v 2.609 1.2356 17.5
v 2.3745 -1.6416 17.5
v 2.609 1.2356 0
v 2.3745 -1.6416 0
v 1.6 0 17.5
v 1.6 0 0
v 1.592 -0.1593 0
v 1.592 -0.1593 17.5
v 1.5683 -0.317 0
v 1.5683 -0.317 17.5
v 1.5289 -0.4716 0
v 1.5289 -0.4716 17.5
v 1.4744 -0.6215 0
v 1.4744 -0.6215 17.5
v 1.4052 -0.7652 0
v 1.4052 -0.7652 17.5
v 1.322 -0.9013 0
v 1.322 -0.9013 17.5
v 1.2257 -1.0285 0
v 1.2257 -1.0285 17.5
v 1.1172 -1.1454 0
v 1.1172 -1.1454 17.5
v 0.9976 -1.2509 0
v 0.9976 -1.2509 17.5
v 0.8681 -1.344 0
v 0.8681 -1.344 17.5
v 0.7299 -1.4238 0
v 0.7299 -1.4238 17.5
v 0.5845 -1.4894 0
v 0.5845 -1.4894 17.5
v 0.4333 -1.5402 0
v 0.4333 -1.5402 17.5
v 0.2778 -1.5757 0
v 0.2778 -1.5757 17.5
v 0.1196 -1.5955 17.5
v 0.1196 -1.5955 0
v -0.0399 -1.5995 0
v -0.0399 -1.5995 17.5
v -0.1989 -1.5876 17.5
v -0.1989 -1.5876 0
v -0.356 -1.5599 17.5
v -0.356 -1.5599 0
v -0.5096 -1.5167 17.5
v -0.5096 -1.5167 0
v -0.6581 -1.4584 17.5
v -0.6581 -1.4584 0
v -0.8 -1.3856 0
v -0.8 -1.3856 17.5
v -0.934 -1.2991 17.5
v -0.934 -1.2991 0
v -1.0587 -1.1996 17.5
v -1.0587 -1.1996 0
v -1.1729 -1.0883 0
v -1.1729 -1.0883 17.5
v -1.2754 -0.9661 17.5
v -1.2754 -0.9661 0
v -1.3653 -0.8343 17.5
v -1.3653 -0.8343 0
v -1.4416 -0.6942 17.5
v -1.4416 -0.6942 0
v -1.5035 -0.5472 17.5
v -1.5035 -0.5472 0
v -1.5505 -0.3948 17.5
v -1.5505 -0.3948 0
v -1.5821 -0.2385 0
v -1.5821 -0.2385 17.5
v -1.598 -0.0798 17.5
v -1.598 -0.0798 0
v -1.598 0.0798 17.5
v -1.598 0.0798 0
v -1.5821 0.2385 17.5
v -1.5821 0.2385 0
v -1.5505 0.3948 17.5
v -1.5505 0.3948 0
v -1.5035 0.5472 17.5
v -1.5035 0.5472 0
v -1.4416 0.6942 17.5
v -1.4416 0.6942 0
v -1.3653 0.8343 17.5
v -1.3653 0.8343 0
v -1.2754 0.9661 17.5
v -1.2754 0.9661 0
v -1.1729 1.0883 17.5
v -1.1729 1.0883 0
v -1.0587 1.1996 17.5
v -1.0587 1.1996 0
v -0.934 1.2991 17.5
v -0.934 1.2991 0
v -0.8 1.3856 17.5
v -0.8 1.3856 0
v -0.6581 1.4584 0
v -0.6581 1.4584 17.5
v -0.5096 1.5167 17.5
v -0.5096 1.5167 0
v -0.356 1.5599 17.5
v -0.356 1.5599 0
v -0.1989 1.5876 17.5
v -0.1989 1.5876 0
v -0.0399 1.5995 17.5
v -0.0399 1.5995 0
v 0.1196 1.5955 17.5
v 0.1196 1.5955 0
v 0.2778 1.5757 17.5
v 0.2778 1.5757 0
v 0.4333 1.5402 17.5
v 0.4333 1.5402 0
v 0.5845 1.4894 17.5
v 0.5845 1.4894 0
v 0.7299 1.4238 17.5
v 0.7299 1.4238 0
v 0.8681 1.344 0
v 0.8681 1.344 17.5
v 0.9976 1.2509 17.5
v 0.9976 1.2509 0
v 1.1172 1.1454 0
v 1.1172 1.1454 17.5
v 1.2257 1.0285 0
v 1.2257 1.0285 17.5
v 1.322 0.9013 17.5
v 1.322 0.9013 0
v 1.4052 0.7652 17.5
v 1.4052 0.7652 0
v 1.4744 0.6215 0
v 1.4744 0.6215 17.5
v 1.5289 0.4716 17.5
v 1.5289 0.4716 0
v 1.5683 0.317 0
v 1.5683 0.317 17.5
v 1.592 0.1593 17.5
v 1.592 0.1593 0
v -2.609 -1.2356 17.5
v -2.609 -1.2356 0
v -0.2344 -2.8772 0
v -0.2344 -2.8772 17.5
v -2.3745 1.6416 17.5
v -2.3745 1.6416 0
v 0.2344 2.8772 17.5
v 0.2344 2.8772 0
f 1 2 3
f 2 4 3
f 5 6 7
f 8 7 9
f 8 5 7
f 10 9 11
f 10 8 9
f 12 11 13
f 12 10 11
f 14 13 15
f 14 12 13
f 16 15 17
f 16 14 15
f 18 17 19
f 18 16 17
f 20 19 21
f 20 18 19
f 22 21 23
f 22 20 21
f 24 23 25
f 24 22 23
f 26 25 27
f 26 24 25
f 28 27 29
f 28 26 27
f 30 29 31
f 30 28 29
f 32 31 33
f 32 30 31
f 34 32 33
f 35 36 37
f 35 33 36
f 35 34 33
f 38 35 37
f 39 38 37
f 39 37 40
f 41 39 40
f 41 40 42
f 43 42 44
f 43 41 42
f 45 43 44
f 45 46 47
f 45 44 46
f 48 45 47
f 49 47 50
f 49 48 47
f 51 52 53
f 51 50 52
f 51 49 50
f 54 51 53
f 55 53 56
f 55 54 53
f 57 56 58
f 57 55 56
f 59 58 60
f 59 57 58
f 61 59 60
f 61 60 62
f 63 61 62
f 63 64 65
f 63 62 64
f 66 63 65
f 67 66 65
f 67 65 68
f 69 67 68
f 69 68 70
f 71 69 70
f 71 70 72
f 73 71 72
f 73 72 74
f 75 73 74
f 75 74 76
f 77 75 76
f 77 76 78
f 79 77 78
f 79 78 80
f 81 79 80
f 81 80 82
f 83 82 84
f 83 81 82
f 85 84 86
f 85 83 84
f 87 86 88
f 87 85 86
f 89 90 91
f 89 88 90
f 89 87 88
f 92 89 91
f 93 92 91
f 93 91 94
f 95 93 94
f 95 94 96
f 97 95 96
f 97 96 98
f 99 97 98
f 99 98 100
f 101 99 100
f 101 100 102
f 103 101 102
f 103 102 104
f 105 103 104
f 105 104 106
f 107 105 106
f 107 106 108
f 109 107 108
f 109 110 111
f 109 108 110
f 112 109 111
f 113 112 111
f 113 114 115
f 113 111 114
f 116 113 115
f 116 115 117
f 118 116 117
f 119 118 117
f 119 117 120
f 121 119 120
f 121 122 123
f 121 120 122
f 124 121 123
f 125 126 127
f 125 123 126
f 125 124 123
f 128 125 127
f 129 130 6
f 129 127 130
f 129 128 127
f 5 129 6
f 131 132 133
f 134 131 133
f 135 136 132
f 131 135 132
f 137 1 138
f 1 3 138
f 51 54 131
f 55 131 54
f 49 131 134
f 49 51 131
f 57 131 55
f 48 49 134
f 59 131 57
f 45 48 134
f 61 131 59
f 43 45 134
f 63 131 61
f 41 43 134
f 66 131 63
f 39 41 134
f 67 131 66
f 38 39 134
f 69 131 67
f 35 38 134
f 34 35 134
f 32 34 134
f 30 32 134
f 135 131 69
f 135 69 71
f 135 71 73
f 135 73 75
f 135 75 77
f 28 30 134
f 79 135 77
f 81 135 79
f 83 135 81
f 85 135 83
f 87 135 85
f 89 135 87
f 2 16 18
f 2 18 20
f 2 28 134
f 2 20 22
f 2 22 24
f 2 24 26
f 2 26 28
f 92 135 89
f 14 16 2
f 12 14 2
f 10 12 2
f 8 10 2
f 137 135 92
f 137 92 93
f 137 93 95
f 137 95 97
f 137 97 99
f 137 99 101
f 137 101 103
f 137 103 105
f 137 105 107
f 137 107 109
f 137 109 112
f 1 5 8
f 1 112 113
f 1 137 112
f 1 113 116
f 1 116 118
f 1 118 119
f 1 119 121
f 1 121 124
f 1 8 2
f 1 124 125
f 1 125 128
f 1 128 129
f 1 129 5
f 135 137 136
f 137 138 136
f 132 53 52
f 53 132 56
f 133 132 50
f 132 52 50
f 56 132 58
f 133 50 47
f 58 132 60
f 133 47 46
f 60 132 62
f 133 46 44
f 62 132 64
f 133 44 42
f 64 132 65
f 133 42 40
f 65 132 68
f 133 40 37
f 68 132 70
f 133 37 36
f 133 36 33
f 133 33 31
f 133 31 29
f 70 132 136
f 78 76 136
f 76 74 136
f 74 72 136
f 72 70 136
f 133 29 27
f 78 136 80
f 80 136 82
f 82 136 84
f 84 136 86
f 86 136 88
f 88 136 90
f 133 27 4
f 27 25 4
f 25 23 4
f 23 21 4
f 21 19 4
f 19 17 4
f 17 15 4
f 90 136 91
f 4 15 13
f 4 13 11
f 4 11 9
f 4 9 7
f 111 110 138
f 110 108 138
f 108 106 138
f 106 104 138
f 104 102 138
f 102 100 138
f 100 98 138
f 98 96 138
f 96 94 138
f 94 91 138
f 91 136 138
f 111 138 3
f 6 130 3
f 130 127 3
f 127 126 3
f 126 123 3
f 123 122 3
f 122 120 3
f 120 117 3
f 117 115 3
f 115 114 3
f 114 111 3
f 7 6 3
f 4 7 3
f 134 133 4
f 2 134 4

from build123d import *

# Parameters (mm, degrees)
BOSS_EXTRUDE1_DEPTH = 5
SKETCH2_R           = 1.6
CUT_EXTRUDE1_DEPTH  = 5
BOSS_EXTRUDE2_DEPTH = 12.5
CUT_EXTRUDE2_START  = -12.5
SKETCH4_R           = 1.6
CUT_EXTRUDE2_DEPTH  = 12.5


with BuildPart() as part:
    # Sketch1 → Boss-Extrude1 (new body)
    with BuildSketch(Plane.XY):
        Polygon((-2.374519268, 1.641642951), (-2.608964134, -1.235572533), (-0.234444865, -2.877215483), (2.374519268, -1.641642951), (2.608964134, 1.235572533), (0.234444865, 2.877215483), align=None)
    extrude(amount=BOSS_EXTRUDE1_DEPTH)

    # Sketch2 → Cut-Extrude1 (cut)
    with BuildSketch(Plane.XY.offset(5)):
        Circle(SKETCH2_R)
    extrude(amount=-CUT_EXTRUDE1_DEPTH, mode=Mode.SUBTRACT)

    # Sketch3 → Boss-Extrude2 (add)
    with BuildSketch(Plane.XY.offset(5)):
        Polygon((-0.234444865, -2.877215483), (2.374519268, -1.641642951), (2.608964134, 1.235572533), (0.234444865, 2.877215483), (-2.374519268, 1.641642951), (-2.608964134, -1.235572533), align=None)
    extrude(amount=BOSS_EXTRUDE2_DEPTH)

    # Sketch4 → Cut-Extrude2 (cut)
    with BuildSketch(Plane(origin=(0, 0, 5), x_dir=(-1, 0, 0), z_dir=(0, 0, -1)).offset(CUT_EXTRUDE2_START)):
        with Locations(Location((0, 0, 0), (0, 0, 180))):
            Circle(SKETCH4_R)
    extrude(amount=CUT_EXTRUDE2_DEPTH, mode=Mode.SUBTRACT)


solid = part.part
